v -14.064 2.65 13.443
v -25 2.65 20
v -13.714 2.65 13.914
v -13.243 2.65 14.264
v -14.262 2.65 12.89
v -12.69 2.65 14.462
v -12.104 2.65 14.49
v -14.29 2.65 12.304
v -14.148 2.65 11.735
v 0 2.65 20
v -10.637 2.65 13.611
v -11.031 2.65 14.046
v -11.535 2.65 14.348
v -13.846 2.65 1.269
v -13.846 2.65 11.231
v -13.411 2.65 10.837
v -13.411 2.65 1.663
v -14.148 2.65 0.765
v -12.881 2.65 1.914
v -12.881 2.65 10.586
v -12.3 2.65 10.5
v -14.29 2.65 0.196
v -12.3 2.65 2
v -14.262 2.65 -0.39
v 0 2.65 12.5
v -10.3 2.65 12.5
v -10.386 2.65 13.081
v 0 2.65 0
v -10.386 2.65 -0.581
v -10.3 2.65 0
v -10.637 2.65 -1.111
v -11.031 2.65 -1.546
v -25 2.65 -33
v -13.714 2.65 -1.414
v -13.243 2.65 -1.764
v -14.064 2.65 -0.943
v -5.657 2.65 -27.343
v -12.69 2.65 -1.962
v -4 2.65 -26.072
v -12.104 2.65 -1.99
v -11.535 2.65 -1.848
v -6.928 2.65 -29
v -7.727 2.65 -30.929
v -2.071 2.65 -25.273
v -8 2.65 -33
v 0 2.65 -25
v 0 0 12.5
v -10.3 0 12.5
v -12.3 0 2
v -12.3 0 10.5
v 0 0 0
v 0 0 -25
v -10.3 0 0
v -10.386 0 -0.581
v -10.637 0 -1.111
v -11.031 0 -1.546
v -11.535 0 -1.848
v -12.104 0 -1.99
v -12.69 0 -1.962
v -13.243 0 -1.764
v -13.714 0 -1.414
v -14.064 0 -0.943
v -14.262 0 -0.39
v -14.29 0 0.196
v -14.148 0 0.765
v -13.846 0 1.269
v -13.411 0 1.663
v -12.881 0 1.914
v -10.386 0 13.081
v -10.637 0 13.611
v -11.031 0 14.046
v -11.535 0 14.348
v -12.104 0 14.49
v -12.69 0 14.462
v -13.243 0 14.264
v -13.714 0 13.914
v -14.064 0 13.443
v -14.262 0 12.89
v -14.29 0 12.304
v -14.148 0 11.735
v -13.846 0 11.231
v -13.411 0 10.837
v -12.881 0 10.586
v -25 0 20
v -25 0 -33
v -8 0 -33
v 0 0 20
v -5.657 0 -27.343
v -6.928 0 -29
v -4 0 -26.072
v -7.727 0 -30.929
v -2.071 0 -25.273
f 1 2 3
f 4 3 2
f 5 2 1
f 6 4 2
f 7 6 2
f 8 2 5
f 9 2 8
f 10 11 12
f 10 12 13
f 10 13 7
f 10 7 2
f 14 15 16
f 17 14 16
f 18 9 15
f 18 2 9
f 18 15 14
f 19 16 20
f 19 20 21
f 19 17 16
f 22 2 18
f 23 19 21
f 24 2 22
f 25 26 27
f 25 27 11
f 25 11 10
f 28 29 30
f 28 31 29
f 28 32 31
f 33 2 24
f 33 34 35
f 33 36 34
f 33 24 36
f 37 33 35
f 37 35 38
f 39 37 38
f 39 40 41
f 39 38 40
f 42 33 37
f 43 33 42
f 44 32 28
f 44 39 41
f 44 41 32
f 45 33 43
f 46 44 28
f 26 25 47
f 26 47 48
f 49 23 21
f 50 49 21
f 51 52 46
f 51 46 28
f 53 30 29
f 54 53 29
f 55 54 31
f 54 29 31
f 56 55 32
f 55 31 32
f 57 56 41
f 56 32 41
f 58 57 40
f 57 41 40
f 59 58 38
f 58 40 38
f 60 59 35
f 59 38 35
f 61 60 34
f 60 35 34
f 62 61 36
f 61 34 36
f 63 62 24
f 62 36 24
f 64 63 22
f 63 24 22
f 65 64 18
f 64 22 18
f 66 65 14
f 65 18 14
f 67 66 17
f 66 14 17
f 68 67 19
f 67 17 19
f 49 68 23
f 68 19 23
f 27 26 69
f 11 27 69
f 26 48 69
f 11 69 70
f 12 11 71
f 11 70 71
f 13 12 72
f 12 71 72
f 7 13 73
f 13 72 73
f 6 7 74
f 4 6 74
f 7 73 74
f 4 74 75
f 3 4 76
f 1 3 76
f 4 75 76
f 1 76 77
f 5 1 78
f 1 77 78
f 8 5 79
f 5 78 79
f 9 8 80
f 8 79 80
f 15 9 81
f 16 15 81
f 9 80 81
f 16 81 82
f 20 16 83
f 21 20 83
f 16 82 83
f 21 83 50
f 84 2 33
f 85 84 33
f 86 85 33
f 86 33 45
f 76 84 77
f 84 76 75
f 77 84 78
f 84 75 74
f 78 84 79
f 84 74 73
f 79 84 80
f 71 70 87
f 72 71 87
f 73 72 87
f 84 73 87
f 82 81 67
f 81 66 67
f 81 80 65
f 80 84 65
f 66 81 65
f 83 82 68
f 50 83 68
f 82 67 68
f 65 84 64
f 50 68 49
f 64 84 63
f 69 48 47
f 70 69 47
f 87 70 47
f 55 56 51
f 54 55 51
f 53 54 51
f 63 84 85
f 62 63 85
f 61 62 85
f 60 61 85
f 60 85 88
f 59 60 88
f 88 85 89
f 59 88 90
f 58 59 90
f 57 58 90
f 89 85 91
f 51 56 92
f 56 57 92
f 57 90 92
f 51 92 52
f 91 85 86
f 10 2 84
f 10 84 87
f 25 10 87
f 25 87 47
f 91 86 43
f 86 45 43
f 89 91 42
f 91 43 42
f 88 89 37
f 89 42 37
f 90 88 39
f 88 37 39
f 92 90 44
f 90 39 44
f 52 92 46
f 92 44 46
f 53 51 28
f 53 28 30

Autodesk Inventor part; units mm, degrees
ref_plane "YZ Plane" through (0, 0, 0) normal (1, 0, 0) x (0, 1, 0)
ref_plane "XZ Plane" through (0, 0, 0) normal (0, 1, 0) x (-1, 0, 0)
ref_plane "XY Plane" through (0, 0, 0) normal (0, 0, 1) x (1, 0, 0)
sketch "スケッチ1" plane through (0, 0, 0) normal (0, 1, 0) x (-1, 0, 0)
  line L0 (0, 0) -> (25, 0)
  line L1 (25, 0) -> (25, -33)
  line L2 (25, -33) -> (0, -33)
  line L3 (0, -33) -> (0, 0)
  line L4 (25, -27) -> (0, -33)
  dimension "d0" = 33
  dimension "d1" = 25
  dimension "d2" = 27
extrude "押し出し1" add sketch "スケッチ1" along normal blind 2.65
sketch "スケッチ2" plane through (0, 2.65, 0) normal (0, 1, 0) x (1, 0, 0)
  line L0 (0, 0) -> (0, 33) projected
  circle A0 centre (0, 33) radius 8
  dimension "d5" = 16
extrude "押し出し2" cut sketch "スケッチ2" against normal blind 2.65
sketch "スケッチ3" plane through (0, 2.65, 0) normal (0, 1, 0) x (1, 0, 0)
  line L0 (-25, 0) -> (0, 0) projected
  line L1 (-25, 0) -> (-12.3, 0)
  line L2 (-12.3, 0) -> (-12.3, -20)
  line L3 (-12.3, -20) -> (-25, -20)
  line L4 (-25, -20) -> (-25, 0)
  line L5 (0, 0) -> (0, 25) projected
  circle A0 centre (-12.3, 0) radius 2
  point P0 (-12.3, -2)
  point P1 (-14.3, 0)
  dimension "d8" = 20
  dimension "d9" = 12.3
  dimension "d10" = 4
extrude "押し出し3" add sketch "スケッチ3" against normal blind 2.65 contours A0 L2 L3 L4 L0
sketch "スケッチ4" plane through (0, 2.65, 0) normal (0, 1, 0) x (1, 0, 0)
  arc A0 (-14.3, 0) -> (-12.3, -2) centre (-12.3, 0) ccw projected
  line L0 (-12.3, -2) -> (-12.3, -20) projected
  circle A1 centre (-12.3, 0) radius 2
  point P0 (0, 0)
  point P1 (-14.3, 0)
extrude "押し出し4" cut sketch "スケッチ4" against normal blind 2.65
sketch "スケッチ5" plane through (0, 2.65, 0) normal (0, 1, 0) x (1, 0, 0)
  line L0 (-25, -20) -> (-12.3, -20) projected
  line L1 (-12.3, -20) -> (0, -20)
  line L2 (0, -20) -> (0, -12.5)
  line L3 (0, -12.5) -> (-12.3, -12.5)
  line L4 (-12.3, -12.5) -> (-12.3, -20)
  line L5 (-10.3, 0) -> (0, 0) projected
  dimension "d15" = 12.5
  dimension "d16" = 12.3
extrude "押し出し5" add sketch "スケッチ5" against normal blind 2.65
sketch "スケッチ6" plane through (0, 2.65, 0) normal (0, 1, 0) x (1, 0, 0)
  line L0 (-12.3, -12.5) -> (-12.3, -2) projected
  point P0 (0, 0)
hole "穴1" at (-12.3, 2.65, 12.5) direction (0, -1, 0) diameter 4 end through all
properties part number "bendpart_90deg"
